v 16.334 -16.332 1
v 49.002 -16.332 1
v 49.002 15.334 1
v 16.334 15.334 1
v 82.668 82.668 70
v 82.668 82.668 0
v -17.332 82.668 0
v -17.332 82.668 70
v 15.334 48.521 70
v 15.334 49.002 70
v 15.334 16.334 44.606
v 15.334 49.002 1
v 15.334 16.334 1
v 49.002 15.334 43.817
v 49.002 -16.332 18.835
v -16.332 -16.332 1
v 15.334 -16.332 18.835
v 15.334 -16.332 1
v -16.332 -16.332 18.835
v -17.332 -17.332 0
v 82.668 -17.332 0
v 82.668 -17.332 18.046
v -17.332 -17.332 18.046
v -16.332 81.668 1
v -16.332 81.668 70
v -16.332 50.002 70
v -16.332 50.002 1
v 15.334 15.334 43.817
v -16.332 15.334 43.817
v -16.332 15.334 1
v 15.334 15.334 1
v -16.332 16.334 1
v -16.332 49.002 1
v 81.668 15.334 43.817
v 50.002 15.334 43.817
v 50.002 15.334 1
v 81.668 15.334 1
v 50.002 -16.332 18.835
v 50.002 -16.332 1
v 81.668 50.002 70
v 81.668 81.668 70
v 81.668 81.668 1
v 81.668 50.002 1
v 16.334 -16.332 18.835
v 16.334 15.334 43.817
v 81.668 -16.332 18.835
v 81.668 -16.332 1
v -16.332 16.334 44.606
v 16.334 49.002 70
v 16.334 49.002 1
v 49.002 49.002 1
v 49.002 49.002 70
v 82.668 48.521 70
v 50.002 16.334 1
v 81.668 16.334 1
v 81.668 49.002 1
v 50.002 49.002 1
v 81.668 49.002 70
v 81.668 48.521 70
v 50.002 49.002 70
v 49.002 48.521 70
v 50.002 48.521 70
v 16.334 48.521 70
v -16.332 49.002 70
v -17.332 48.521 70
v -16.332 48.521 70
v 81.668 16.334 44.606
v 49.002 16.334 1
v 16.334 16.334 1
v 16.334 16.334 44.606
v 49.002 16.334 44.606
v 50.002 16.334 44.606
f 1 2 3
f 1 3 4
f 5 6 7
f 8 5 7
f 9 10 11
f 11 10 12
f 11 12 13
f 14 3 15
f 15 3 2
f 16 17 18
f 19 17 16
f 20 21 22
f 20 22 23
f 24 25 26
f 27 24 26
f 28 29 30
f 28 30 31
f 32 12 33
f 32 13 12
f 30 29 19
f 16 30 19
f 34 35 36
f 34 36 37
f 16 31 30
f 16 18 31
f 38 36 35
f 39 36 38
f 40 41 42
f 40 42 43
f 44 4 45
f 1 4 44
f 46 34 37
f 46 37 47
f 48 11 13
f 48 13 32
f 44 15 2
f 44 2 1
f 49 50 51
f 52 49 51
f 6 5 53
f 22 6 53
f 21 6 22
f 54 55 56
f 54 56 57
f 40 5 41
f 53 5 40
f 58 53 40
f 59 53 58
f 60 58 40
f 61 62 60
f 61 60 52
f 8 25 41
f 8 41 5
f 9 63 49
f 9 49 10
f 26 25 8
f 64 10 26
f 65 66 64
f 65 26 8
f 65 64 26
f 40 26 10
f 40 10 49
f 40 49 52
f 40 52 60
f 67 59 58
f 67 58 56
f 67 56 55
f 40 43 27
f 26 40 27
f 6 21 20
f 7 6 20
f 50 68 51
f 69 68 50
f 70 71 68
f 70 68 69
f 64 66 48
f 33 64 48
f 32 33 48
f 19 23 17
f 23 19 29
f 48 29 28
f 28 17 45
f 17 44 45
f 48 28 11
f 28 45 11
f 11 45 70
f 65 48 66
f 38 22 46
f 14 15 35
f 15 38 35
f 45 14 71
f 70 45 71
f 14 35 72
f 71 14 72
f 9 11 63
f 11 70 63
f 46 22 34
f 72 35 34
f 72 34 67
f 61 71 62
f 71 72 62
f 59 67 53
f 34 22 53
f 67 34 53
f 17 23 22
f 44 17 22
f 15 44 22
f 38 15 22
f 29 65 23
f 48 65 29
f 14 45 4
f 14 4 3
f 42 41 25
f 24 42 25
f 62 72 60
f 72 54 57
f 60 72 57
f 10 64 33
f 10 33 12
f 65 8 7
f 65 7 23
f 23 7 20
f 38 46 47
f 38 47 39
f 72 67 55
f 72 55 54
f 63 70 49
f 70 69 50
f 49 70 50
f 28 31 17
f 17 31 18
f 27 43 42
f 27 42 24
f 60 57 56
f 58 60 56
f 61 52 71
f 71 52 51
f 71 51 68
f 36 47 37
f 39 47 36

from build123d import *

# Parameters (mm, degrees)
F0_W     = 100
F0_H     = 100
F1_DEPTH = 70
F2_W     = 98
F2_H     = 98
F3_DEPTH = 69
F4_W     = 31.666
F4_H     = 1
F4_W_2   = 1
F4_W_3   = 32.668
F4_H_2   = 32.668
F4_H_3   = 31.666
F5_DEPTH = 69
F7_DEPTH = 100.001
F8_ANGLE = 180


with BuildPart() as f1:
    # F0 (on Top) → F1 (new body)
    with BuildSketch(Plane.XY):
        Rectangle(F0_W, F0_H)
    extrude(amount=F1_DEPTH)

    # F2 (on face) → F3 (cut)
    with BuildSketch(Plane.XY.offset(70)):
        Rectangle(F2_W, F2_H)
    extrude(amount=-F3_DEPTH, mode=Mode.SUBTRACT)

    # F4 (on face) → F5 (join)
    with BuildSketch(Plane.XY.offset(1)):
        with Locations((33.167, -16.834)):
            Rectangle(F4_W, F4_H)
        with Locations((16.834, -16.834)):
            Rectangle(F4_W_2, F4_H)
        with Locations((0, -16.834)):
            Rectangle(F4_W_3, F4_H)
        with Locations((-16.834, -16.834)):
            Rectangle(F4_W_2, F4_H)
        with Locations((-33.167, -16.834)):
            Rectangle(F4_W, F4_H)
        with Locations((-16.834, 0)):
            Rectangle(F4_W_2, F4_H_2)
        with Locations((16.834, 0)):
            Rectangle(F4_W_2, F4_H_2)
        with Locations((33.167, 16.834)):
            Rectangle(F4_W, F4_H)
        with Locations((16.834, 16.834)):
            Rectangle(F4_W_2, F4_H)
        with Locations((0, 16.834)):
            Rectangle(F4_W_3, F4_H)
        with Locations((-16.834, 16.834)):
            Rectangle(F4_W_2, F4_H)
        with Locations((-33.167, 16.834)):
            Rectangle(F4_W, F4_H)
        with Locations((-16.834, 33.167)):
            Rectangle(F4_W_2, F4_H_3)
        with Locations((16.834, 33.167)):
            Rectangle(F4_W_2, F4_H_3)
    extrude(amount=F5_DEPTH)

    # F6 (on face) → F7 (cut, through all)
    with BuildSketch(Plane(origin=(-50, 0, 0), x_dir=(0, -1, 0), z_dir=(-1, 0, 0))):
        Polygon((-50, 18.0460233241), (15.8534999937, 70), (-50, 70), align=None)
    extrude(amount=-F7_DEPTH, mode=Mode.SUBTRACT)


with BuildPart() as f1_1:
    # F8: moved
    add(f1.part.rotate(Axis((16.334, 16.334, 35.5), (0, 0, -1)), F8_ANGLE))


solid = f1_1.part
